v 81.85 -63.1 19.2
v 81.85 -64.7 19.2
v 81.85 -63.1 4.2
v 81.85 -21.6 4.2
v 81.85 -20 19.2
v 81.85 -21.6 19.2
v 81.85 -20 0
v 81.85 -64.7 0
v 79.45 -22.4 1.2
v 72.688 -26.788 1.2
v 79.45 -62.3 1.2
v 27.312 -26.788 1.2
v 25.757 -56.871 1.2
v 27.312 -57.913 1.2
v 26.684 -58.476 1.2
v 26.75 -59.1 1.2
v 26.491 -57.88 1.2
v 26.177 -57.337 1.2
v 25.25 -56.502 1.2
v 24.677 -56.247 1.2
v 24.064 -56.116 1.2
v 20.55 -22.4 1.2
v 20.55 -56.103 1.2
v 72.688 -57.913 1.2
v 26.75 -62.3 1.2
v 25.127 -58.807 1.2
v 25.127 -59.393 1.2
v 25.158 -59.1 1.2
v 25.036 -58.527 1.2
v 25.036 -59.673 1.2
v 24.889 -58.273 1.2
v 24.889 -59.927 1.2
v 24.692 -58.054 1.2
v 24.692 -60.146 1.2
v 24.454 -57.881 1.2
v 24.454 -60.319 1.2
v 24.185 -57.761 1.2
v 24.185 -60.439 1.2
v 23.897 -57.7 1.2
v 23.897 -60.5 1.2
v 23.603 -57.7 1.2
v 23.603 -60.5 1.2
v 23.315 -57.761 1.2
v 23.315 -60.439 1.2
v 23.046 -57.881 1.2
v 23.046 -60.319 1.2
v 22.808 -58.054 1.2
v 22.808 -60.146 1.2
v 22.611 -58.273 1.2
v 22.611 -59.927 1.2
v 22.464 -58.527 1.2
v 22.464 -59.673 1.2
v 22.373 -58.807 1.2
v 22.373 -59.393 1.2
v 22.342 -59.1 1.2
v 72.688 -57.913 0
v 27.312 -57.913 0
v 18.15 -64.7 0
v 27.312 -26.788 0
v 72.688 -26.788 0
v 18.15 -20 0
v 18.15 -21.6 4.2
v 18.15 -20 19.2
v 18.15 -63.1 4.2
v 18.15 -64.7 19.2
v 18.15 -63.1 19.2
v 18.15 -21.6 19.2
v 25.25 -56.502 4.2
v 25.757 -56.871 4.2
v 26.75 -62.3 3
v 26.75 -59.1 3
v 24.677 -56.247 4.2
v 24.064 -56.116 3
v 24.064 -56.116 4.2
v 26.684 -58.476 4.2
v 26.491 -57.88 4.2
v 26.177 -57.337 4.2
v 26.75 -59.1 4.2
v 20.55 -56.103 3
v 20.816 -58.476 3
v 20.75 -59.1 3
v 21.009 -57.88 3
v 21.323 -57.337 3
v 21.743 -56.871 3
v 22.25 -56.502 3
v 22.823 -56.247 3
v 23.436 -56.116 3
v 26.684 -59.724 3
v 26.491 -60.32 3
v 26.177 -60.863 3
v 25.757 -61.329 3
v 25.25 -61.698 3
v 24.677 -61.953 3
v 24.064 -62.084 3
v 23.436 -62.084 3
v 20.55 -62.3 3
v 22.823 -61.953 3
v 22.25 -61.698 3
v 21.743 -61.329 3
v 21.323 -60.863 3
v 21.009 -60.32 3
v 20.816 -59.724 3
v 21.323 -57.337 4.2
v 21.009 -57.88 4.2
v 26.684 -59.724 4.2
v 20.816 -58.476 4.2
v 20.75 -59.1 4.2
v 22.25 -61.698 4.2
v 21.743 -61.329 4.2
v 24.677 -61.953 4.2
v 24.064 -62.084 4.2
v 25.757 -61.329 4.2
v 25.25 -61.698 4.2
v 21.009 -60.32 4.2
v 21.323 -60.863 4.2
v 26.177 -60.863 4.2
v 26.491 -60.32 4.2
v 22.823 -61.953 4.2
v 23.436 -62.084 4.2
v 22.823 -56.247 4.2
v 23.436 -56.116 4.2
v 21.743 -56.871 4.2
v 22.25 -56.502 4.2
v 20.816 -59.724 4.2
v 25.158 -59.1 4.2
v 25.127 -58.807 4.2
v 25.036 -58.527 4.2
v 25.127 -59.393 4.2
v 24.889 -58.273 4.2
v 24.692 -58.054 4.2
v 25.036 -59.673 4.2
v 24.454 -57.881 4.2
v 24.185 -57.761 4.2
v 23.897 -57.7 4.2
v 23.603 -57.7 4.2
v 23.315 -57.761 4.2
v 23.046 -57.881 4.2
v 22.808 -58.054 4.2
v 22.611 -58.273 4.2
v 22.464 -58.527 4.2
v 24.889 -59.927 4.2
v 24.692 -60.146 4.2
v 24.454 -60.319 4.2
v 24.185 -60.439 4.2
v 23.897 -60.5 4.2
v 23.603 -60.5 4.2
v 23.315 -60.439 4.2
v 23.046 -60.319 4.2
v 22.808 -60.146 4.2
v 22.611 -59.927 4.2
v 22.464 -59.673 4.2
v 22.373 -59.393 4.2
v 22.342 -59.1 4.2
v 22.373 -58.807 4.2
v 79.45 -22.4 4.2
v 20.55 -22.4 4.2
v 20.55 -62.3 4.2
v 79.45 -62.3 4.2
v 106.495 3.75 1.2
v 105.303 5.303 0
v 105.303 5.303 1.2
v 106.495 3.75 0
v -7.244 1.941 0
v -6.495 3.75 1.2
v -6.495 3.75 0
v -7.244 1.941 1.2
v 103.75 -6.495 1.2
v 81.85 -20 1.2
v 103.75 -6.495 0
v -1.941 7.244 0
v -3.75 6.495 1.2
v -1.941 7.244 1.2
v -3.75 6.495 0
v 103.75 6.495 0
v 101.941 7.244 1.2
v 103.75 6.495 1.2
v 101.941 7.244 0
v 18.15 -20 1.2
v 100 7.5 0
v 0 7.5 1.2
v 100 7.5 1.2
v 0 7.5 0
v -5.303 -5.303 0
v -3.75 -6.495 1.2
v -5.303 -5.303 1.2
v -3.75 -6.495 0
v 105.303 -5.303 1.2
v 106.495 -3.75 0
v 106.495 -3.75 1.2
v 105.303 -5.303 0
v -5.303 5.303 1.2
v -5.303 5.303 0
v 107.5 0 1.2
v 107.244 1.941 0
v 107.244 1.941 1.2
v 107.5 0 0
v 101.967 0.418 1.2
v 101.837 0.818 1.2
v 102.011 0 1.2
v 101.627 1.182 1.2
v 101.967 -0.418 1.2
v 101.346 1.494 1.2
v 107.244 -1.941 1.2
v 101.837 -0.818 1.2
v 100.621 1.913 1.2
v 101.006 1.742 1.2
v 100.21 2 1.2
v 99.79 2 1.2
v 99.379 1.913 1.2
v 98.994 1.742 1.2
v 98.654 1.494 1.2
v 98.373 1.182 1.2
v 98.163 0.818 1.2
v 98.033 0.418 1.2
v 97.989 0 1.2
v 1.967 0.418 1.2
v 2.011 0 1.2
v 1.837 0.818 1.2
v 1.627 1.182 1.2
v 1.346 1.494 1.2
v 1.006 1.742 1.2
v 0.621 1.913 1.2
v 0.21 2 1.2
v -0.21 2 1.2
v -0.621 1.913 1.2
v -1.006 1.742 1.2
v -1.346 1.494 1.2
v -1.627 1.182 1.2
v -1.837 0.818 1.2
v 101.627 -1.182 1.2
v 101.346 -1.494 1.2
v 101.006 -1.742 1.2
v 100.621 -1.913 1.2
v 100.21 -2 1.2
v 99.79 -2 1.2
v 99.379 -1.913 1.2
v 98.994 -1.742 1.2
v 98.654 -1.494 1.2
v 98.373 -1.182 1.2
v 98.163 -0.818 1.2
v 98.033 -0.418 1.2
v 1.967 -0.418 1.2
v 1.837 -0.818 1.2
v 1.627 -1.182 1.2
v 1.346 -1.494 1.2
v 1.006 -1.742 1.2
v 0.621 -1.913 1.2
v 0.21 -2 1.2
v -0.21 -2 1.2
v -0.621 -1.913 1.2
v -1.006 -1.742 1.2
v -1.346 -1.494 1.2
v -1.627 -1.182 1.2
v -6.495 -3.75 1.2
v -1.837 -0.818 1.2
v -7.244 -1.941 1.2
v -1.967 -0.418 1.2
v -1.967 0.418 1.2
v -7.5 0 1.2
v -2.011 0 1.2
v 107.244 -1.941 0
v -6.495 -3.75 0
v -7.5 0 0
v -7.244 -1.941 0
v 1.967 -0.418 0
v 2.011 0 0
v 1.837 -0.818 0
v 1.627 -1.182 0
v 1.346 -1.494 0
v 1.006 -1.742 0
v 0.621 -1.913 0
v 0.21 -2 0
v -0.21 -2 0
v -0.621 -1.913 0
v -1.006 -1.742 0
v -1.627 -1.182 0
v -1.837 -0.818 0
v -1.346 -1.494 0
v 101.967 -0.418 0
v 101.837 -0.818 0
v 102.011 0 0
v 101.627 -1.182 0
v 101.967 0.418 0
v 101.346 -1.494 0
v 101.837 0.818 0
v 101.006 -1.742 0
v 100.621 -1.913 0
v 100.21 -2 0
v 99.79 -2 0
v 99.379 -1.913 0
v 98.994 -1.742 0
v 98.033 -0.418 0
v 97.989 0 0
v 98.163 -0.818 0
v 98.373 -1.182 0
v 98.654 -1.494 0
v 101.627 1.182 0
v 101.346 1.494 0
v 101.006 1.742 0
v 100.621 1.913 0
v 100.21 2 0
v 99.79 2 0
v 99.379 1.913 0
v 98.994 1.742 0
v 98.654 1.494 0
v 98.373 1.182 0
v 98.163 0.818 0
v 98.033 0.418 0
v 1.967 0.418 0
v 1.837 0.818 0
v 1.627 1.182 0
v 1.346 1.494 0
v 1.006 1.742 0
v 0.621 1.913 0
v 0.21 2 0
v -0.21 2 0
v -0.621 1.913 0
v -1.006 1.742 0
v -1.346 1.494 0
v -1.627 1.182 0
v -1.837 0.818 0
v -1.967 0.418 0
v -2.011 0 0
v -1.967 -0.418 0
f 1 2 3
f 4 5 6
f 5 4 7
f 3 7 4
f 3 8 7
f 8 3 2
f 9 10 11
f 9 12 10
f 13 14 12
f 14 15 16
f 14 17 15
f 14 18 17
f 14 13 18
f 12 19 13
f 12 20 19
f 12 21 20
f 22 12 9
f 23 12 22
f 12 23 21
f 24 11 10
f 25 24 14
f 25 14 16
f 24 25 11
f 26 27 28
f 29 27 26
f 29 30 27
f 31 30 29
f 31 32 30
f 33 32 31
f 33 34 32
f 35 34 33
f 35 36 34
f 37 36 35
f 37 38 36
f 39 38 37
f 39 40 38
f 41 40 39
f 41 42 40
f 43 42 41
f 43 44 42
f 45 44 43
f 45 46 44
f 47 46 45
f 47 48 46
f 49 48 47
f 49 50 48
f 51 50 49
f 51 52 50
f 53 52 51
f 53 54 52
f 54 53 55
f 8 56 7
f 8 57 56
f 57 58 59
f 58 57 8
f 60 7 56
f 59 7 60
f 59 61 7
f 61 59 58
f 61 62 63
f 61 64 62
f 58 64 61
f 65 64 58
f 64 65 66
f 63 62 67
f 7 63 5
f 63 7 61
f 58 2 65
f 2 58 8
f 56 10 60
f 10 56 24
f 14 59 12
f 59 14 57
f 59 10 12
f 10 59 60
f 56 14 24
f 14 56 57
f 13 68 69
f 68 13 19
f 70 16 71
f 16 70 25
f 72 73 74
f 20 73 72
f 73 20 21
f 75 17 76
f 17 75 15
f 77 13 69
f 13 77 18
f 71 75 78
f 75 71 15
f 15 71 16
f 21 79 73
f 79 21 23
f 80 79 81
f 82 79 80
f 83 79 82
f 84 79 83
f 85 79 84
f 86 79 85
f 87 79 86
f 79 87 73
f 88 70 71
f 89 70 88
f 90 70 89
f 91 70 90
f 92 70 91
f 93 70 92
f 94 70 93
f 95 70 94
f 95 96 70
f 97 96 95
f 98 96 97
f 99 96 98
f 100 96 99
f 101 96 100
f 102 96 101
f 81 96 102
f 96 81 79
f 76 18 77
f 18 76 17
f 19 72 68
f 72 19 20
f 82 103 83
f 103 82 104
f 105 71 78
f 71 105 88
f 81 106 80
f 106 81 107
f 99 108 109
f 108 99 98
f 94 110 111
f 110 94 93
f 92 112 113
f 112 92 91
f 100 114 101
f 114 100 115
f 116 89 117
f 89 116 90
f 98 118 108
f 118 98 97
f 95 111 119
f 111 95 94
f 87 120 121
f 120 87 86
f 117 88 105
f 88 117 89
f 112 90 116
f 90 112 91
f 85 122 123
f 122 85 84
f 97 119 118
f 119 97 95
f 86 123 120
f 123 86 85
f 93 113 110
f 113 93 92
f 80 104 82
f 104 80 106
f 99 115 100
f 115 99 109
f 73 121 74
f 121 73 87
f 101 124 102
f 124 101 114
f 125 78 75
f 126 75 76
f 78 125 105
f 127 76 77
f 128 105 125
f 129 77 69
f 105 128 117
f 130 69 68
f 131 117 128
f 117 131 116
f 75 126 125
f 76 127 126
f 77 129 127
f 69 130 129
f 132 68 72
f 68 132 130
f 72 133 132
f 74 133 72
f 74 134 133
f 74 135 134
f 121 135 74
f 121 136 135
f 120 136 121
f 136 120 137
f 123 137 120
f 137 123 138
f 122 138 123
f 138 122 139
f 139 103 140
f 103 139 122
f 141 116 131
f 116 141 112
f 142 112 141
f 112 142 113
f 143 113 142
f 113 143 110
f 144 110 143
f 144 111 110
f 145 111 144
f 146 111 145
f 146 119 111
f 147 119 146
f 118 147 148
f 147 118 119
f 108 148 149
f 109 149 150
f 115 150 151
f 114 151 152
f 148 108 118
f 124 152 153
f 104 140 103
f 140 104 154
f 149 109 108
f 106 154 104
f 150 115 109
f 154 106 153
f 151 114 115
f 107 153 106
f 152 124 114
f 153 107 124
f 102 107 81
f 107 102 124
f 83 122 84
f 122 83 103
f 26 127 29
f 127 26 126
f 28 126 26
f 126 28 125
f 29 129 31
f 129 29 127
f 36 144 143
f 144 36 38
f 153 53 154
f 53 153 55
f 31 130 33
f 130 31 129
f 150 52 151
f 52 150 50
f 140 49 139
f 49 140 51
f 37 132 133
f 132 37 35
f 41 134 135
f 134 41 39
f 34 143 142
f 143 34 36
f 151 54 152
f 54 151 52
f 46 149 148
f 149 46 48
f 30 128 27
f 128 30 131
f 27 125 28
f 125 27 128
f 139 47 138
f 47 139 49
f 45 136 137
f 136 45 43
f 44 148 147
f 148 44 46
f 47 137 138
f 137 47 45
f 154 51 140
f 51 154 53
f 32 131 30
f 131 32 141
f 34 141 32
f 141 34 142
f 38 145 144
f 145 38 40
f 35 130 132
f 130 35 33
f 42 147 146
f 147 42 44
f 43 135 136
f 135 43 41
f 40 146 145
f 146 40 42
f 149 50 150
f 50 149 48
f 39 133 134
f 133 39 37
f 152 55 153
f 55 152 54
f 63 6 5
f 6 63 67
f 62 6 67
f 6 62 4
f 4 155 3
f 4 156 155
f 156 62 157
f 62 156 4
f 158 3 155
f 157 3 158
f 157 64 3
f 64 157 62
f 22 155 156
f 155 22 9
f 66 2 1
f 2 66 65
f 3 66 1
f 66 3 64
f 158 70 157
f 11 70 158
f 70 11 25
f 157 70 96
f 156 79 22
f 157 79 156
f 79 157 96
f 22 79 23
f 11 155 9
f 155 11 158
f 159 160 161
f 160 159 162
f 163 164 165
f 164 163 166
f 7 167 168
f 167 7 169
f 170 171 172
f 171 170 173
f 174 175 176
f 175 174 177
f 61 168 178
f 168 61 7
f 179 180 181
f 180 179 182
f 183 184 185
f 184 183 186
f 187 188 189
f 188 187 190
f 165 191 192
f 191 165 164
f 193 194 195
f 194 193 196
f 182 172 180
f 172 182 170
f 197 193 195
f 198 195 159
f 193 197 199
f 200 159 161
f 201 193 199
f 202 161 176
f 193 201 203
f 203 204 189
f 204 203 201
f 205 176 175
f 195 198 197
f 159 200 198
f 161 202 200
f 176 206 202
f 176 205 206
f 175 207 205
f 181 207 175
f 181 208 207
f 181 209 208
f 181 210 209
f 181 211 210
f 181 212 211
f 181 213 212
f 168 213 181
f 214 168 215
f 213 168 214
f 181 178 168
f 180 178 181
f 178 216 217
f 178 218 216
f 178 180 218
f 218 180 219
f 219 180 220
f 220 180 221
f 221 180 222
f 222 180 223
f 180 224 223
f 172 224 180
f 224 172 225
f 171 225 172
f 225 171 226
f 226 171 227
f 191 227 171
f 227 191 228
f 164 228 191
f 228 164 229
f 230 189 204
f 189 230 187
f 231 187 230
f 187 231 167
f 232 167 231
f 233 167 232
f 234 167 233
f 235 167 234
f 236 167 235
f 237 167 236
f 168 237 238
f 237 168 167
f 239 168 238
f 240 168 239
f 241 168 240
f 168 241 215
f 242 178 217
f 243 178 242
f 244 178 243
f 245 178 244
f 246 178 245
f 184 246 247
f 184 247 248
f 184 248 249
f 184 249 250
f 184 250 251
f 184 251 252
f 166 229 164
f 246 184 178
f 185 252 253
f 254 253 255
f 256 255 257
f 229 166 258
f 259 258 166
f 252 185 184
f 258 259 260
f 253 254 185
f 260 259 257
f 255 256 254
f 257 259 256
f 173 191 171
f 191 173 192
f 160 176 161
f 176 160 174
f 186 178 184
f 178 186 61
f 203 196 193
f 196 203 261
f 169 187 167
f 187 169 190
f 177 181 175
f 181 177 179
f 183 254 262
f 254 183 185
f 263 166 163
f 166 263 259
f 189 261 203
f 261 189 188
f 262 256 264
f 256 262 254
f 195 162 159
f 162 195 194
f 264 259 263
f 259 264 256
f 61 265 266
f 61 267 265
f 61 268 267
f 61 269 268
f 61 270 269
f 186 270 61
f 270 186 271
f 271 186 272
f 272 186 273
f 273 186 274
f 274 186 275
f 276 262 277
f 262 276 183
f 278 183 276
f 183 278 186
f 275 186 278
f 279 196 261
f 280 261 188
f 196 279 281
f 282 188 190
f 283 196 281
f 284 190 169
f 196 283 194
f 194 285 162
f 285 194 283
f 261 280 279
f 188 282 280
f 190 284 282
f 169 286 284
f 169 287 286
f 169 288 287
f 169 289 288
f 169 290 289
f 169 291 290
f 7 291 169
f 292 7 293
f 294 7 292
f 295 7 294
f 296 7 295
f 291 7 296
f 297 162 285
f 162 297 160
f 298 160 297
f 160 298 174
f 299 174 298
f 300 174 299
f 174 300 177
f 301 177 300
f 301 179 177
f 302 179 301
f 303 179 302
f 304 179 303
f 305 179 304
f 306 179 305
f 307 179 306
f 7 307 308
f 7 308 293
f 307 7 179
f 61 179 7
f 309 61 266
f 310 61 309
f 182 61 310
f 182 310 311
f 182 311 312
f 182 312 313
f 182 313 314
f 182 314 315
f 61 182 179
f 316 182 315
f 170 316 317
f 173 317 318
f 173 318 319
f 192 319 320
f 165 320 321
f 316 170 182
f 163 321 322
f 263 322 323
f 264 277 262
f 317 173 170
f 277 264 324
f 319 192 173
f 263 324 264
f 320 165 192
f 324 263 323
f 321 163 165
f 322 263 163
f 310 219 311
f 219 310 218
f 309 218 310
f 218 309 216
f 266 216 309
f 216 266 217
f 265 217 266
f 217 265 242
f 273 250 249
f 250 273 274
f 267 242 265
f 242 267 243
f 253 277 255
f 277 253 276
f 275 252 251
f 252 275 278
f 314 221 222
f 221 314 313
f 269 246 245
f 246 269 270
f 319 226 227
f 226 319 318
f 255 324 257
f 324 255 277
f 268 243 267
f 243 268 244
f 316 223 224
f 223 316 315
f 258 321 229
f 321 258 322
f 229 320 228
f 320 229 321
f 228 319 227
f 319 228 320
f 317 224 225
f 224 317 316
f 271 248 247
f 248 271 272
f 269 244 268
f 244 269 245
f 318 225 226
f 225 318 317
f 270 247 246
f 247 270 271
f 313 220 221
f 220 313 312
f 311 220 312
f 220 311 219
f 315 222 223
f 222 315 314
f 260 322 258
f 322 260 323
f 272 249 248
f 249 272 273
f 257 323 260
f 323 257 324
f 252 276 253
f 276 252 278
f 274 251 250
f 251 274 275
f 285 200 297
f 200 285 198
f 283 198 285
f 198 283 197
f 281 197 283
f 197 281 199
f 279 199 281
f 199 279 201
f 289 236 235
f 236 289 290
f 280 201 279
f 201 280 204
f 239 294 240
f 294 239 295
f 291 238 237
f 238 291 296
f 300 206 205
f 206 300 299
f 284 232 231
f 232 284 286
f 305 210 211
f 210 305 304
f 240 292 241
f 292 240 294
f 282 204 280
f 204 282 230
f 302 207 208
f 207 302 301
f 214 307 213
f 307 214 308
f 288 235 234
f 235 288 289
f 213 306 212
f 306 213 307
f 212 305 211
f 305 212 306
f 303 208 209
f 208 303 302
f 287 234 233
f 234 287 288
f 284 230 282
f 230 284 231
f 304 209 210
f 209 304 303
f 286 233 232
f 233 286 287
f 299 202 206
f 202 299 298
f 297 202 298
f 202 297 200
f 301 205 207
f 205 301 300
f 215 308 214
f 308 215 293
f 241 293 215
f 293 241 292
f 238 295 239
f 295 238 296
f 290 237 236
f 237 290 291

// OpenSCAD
hole_diameter = 4;
mount_diameter = 15;
vesa_size = 100;
base_thickness = 1.2;
wall_thickness = 1.6;
use_four_holes = 0;  // [0:No, 1:Yes]
mount_offset = 20;
chip_length = 60.5;
chip_width = 41.5;
chip_height = 18;
riser_height = 3;
riser_width = 0.8;
mount_top = 1;  // [0:No, 1:Yes]
mount_bottom = 1;  // [0:No, 1:Yes]
mount_left = 0;  // [0:No, 1:Yes]
mount_right = 0;  // [0:No, 1:Yes]
riser_top = 1;  // [0:No, 1:Yes]
riser_bottom = 1;  // [0:No, 1:Yes]
riser_left = 1;  // [0:No, 1:Yes]
riser_right = 1;  // [0:No, 1:Yes]
lighten_mount = 1;  // [0:No, 1:Yes]
dual_mount = 0;  // [0:No, 1:Yes]
bottom_left_hole = 1;  // [0:No, 1:Yes]
bl_hole_x = 4;
bl_hole_y = 4;
bl_hole_diameter = 2.8;
bl_hole_thickness = 1.6;

hole_radius = hole_diameter / 2.0;
mount_radius = mount_diameter / 2.0;
mount_diag = sqrt(2.0) * vesa_size;
full_length = (dual_mount ? 2 : 1) * (2 * wall_thickness + chip_length);


module hole(radius, thickness){
  fn = 30;
  fudge = 1 / cos(180 / fn);
  translate([0, 0, -thickness*0.01]) {
    cylinder(h=thickness * 1.02, r=radius * fudge, $fn=fn);
  }
} 
  

module chip_mount(length, width, height, base_thickness, wall_thickness,
                  riser_width, riser_height,
                  mount_top, riser_top, mount_bottom, riser_bottom,
                  mount_left, riser_left, mount_right, riser_right, lighten,
                  bottom_left_hole, bl_hole_x, bl_hole_y, bl_hole_diameter,
                  bl_hole_thickness) {
  // Mount base
  difference() {
    cube([length + 2 * wall_thickness,
          width + 2 * wall_thickness,
          base_thickness]);
    if (lighten) {
      translate([wall_thickness + length * 0.125,
                 wall_thickness + width * 0.125,
                 -base_thickness * 0.1]) {
        cube([length * 0.75, width * 0.75, base_thickness * 1.2]);
      }
    }
  }
  // Mount top
  if (mount_top) {
    translate([0, wall_thickness + width, base_thickness]) {
      cube([length + 2 * wall_thickness, wall_thickness, height]);
    }
  }
  // Riser top
  if (riser_top) {
    translate([0, wall_thickness + width - riser_width, base_thickness]) {
      cube([length + 2 * wall_thickness,
            wall_thickness + riser_width,
            riser_height]);
    }
  }
  // Mount bottom
  if (mount_bottom) {
    cube([length + 2 * wall_thickness, wall_thickness, base_thickness + height]);
  }
  // Riser bottom
  if (riser_bottom) {
    cube([length + 2 * wall_thickness,
          wall_thickness + riser_width,
          base_thickness + riser_height]);
  }
  // Mount left
  if (mount_left) {
    cube([wall_thickness,
          width + 2 * wall_thickness,
          base_thickness + height]);
  }        
  // Riser left
  if (riser_left) {
    cube([wall_thickness + riser_width,
          width + 2 * wall_thickness,
          base_thickness + riser_height]);
  }        
  // Mount right
  if (mount_right) {
    translate([wall_thickness + length, 0, 0]) {
      cube([wall_thickness, width + 2 * wall_thickness, base_thickness + height]);
    }
  }
  // Riser right
  if (riser_right) {
    translate([wall_thickness + length - riser_width, 0, 0]) {
      cube([wall_thickness + riser_width,
            width + 2 * wall_thickness,
            base_thickness + riser_height]);
    }
  }
  // Bottom left hole
  if (bottom_left_hole) {
    bl_inner_radius = bl_hole_diameter * 0.5;
    bl_outer_radius = bl_inner_radius + bl_hole_thickness;
    support_height =
        (bl_hole_x < 6 && bl_hole_y < 6) ? riser_height : base_thickness;
    difference() {
      union() {
        hull() {
          cube([wall_thickness + bl_hole_x + bl_outer_radius,
                wall_thickness,
                support_height]);
          cube([wall_thickness,
                wall_thickness + bl_hole_y + bl_outer_radius,
                support_height]);
          translate([wall_thickness + bl_hole_x,
                     wall_thickness + bl_hole_y,
                     0]) {
            cylinder(r=bl_outer_radius, h=support_height, $fn=30);
          }
        }
        translate([wall_thickness + bl_hole_x, wall_thickness + bl_hole_y, 0]) {
          cylinder(r=bl_outer_radius, h=riser_height + base_thickness, $fn=30);
        }
      }
      translate([wall_thickness + bl_hole_x, wall_thickness + bl_hole_y, 0]) {
        hole(bl_inner_radius, riser_height + base_thickness);
      }
    }
    // Fill in the bottom of the hole
    translate([wall_thickness + bl_hole_x, wall_thickness + bl_hole_y, 0]) {
      cylinder(r=bl_outer_radius, h=base_thickness, $fn=30);
    }
  }
}

difference() {
  union() {
    if (use_four_holes) {
      // Mount-3
      translate([0, vesa_size, 0]) {
        cylinder(h=base_thickness, d=mount_diameter);
      }
      // Mount-4
      translate([vesa_size, vesa_size, 0]) {
        cylinder(h=base_thickness, d=mount_diameter);
      }
      // Connection 1-3
      translate([-mount_radius, 0, 0]) {
        cube([mount_diameter, vesa_size, base_thickness]);
      }
      // Connection 2-4
      translate([vesa_size - mount_radius, 0, 0]) {
        cube([mount_diameter, vesa_size, base_thickness]);
      }
      // Connection 1-4
      rotate([0,0, 45]) {
        translate([0, -mount_radius, 0]) {
          cube([mount_diag, mount_diameter, base_thickness]);
        }
      }
      // Connection 2-3
      translate([vesa_size, 0, 0]) {
        rotate([0,0, 135]) {
          translate([0, -mount_radius, 0]) {
            cube([mount_diag, mount_diameter, base_thickness]);
          }
        }
      }
    }
    // Main mount
    hull() {
      // Mount-1
      cylinder(h=base_thickness, d=mount_diameter);
      // Mount-2
      translate([vesa_size, 0, 0]) {
        cylinder(h=base_thickness, d=mount_diameter);
      }
      // Mount offset
      translate([(vesa_size - full_length) * 0.5, -mount_offset, 0]) {
        cube([full_length, wall_thickness, base_thickness]);
      }
    }
    translate([(vesa_size - full_length) * 0.5,
               -(mount_offset + 2 * wall_thickness + chip_width), 0]) {
      chip_mount(chip_length, chip_width, chip_height, base_thickness,
                 wall_thickness, riser_width, riser_height,
                 mount_top, riser_top, mount_bottom, riser_bottom,
                 mount_left, riser_left, mount_right, riser_right, lighten_mount,
                 bottom_left_hole, bl_hole_x, bl_hole_y, bl_hole_diameter,
                 bl_hole_thickness);
    }
    if (dual_mount) {
      translate([(vesa_size + full_length) * 0.5, -mount_offset, 0]) {
        rotate([0,0,180]) chip_mount(chip_length, chip_width, chip_height,
                   base_thickness, wall_thickness, riser_width, riser_height,
                   mount_top, riser_top, mount_bottom, riser_bottom,
                   mount_left, riser_left, mount_right, riser_right, lighten_mount,
                   bottom_left_hole, bl_hole_x, bl_hole_y, bl_hole_diameter,
                   bl_hole_thickness);
      }
    }
  }  // End union
  // Hole-1
  hole(hole_radius, base_thickness, $fn);
  // Hole-2
  translate([vesa_size, 0, 0]) {
    hole(hole_radius, base_thickness, $fn);
  }
  if (use_four_holes) {
    // Hole-3
    translate([0, vesa_size, 0]) {
      hole(hole_radius, base_thickness, $fn);
    }
    // Hole-4
    translate([vesa_size, vesa_size, 0]) {
      hole(hole_radius, base_thickness, $fn);
    }
  }
}  // End difference
